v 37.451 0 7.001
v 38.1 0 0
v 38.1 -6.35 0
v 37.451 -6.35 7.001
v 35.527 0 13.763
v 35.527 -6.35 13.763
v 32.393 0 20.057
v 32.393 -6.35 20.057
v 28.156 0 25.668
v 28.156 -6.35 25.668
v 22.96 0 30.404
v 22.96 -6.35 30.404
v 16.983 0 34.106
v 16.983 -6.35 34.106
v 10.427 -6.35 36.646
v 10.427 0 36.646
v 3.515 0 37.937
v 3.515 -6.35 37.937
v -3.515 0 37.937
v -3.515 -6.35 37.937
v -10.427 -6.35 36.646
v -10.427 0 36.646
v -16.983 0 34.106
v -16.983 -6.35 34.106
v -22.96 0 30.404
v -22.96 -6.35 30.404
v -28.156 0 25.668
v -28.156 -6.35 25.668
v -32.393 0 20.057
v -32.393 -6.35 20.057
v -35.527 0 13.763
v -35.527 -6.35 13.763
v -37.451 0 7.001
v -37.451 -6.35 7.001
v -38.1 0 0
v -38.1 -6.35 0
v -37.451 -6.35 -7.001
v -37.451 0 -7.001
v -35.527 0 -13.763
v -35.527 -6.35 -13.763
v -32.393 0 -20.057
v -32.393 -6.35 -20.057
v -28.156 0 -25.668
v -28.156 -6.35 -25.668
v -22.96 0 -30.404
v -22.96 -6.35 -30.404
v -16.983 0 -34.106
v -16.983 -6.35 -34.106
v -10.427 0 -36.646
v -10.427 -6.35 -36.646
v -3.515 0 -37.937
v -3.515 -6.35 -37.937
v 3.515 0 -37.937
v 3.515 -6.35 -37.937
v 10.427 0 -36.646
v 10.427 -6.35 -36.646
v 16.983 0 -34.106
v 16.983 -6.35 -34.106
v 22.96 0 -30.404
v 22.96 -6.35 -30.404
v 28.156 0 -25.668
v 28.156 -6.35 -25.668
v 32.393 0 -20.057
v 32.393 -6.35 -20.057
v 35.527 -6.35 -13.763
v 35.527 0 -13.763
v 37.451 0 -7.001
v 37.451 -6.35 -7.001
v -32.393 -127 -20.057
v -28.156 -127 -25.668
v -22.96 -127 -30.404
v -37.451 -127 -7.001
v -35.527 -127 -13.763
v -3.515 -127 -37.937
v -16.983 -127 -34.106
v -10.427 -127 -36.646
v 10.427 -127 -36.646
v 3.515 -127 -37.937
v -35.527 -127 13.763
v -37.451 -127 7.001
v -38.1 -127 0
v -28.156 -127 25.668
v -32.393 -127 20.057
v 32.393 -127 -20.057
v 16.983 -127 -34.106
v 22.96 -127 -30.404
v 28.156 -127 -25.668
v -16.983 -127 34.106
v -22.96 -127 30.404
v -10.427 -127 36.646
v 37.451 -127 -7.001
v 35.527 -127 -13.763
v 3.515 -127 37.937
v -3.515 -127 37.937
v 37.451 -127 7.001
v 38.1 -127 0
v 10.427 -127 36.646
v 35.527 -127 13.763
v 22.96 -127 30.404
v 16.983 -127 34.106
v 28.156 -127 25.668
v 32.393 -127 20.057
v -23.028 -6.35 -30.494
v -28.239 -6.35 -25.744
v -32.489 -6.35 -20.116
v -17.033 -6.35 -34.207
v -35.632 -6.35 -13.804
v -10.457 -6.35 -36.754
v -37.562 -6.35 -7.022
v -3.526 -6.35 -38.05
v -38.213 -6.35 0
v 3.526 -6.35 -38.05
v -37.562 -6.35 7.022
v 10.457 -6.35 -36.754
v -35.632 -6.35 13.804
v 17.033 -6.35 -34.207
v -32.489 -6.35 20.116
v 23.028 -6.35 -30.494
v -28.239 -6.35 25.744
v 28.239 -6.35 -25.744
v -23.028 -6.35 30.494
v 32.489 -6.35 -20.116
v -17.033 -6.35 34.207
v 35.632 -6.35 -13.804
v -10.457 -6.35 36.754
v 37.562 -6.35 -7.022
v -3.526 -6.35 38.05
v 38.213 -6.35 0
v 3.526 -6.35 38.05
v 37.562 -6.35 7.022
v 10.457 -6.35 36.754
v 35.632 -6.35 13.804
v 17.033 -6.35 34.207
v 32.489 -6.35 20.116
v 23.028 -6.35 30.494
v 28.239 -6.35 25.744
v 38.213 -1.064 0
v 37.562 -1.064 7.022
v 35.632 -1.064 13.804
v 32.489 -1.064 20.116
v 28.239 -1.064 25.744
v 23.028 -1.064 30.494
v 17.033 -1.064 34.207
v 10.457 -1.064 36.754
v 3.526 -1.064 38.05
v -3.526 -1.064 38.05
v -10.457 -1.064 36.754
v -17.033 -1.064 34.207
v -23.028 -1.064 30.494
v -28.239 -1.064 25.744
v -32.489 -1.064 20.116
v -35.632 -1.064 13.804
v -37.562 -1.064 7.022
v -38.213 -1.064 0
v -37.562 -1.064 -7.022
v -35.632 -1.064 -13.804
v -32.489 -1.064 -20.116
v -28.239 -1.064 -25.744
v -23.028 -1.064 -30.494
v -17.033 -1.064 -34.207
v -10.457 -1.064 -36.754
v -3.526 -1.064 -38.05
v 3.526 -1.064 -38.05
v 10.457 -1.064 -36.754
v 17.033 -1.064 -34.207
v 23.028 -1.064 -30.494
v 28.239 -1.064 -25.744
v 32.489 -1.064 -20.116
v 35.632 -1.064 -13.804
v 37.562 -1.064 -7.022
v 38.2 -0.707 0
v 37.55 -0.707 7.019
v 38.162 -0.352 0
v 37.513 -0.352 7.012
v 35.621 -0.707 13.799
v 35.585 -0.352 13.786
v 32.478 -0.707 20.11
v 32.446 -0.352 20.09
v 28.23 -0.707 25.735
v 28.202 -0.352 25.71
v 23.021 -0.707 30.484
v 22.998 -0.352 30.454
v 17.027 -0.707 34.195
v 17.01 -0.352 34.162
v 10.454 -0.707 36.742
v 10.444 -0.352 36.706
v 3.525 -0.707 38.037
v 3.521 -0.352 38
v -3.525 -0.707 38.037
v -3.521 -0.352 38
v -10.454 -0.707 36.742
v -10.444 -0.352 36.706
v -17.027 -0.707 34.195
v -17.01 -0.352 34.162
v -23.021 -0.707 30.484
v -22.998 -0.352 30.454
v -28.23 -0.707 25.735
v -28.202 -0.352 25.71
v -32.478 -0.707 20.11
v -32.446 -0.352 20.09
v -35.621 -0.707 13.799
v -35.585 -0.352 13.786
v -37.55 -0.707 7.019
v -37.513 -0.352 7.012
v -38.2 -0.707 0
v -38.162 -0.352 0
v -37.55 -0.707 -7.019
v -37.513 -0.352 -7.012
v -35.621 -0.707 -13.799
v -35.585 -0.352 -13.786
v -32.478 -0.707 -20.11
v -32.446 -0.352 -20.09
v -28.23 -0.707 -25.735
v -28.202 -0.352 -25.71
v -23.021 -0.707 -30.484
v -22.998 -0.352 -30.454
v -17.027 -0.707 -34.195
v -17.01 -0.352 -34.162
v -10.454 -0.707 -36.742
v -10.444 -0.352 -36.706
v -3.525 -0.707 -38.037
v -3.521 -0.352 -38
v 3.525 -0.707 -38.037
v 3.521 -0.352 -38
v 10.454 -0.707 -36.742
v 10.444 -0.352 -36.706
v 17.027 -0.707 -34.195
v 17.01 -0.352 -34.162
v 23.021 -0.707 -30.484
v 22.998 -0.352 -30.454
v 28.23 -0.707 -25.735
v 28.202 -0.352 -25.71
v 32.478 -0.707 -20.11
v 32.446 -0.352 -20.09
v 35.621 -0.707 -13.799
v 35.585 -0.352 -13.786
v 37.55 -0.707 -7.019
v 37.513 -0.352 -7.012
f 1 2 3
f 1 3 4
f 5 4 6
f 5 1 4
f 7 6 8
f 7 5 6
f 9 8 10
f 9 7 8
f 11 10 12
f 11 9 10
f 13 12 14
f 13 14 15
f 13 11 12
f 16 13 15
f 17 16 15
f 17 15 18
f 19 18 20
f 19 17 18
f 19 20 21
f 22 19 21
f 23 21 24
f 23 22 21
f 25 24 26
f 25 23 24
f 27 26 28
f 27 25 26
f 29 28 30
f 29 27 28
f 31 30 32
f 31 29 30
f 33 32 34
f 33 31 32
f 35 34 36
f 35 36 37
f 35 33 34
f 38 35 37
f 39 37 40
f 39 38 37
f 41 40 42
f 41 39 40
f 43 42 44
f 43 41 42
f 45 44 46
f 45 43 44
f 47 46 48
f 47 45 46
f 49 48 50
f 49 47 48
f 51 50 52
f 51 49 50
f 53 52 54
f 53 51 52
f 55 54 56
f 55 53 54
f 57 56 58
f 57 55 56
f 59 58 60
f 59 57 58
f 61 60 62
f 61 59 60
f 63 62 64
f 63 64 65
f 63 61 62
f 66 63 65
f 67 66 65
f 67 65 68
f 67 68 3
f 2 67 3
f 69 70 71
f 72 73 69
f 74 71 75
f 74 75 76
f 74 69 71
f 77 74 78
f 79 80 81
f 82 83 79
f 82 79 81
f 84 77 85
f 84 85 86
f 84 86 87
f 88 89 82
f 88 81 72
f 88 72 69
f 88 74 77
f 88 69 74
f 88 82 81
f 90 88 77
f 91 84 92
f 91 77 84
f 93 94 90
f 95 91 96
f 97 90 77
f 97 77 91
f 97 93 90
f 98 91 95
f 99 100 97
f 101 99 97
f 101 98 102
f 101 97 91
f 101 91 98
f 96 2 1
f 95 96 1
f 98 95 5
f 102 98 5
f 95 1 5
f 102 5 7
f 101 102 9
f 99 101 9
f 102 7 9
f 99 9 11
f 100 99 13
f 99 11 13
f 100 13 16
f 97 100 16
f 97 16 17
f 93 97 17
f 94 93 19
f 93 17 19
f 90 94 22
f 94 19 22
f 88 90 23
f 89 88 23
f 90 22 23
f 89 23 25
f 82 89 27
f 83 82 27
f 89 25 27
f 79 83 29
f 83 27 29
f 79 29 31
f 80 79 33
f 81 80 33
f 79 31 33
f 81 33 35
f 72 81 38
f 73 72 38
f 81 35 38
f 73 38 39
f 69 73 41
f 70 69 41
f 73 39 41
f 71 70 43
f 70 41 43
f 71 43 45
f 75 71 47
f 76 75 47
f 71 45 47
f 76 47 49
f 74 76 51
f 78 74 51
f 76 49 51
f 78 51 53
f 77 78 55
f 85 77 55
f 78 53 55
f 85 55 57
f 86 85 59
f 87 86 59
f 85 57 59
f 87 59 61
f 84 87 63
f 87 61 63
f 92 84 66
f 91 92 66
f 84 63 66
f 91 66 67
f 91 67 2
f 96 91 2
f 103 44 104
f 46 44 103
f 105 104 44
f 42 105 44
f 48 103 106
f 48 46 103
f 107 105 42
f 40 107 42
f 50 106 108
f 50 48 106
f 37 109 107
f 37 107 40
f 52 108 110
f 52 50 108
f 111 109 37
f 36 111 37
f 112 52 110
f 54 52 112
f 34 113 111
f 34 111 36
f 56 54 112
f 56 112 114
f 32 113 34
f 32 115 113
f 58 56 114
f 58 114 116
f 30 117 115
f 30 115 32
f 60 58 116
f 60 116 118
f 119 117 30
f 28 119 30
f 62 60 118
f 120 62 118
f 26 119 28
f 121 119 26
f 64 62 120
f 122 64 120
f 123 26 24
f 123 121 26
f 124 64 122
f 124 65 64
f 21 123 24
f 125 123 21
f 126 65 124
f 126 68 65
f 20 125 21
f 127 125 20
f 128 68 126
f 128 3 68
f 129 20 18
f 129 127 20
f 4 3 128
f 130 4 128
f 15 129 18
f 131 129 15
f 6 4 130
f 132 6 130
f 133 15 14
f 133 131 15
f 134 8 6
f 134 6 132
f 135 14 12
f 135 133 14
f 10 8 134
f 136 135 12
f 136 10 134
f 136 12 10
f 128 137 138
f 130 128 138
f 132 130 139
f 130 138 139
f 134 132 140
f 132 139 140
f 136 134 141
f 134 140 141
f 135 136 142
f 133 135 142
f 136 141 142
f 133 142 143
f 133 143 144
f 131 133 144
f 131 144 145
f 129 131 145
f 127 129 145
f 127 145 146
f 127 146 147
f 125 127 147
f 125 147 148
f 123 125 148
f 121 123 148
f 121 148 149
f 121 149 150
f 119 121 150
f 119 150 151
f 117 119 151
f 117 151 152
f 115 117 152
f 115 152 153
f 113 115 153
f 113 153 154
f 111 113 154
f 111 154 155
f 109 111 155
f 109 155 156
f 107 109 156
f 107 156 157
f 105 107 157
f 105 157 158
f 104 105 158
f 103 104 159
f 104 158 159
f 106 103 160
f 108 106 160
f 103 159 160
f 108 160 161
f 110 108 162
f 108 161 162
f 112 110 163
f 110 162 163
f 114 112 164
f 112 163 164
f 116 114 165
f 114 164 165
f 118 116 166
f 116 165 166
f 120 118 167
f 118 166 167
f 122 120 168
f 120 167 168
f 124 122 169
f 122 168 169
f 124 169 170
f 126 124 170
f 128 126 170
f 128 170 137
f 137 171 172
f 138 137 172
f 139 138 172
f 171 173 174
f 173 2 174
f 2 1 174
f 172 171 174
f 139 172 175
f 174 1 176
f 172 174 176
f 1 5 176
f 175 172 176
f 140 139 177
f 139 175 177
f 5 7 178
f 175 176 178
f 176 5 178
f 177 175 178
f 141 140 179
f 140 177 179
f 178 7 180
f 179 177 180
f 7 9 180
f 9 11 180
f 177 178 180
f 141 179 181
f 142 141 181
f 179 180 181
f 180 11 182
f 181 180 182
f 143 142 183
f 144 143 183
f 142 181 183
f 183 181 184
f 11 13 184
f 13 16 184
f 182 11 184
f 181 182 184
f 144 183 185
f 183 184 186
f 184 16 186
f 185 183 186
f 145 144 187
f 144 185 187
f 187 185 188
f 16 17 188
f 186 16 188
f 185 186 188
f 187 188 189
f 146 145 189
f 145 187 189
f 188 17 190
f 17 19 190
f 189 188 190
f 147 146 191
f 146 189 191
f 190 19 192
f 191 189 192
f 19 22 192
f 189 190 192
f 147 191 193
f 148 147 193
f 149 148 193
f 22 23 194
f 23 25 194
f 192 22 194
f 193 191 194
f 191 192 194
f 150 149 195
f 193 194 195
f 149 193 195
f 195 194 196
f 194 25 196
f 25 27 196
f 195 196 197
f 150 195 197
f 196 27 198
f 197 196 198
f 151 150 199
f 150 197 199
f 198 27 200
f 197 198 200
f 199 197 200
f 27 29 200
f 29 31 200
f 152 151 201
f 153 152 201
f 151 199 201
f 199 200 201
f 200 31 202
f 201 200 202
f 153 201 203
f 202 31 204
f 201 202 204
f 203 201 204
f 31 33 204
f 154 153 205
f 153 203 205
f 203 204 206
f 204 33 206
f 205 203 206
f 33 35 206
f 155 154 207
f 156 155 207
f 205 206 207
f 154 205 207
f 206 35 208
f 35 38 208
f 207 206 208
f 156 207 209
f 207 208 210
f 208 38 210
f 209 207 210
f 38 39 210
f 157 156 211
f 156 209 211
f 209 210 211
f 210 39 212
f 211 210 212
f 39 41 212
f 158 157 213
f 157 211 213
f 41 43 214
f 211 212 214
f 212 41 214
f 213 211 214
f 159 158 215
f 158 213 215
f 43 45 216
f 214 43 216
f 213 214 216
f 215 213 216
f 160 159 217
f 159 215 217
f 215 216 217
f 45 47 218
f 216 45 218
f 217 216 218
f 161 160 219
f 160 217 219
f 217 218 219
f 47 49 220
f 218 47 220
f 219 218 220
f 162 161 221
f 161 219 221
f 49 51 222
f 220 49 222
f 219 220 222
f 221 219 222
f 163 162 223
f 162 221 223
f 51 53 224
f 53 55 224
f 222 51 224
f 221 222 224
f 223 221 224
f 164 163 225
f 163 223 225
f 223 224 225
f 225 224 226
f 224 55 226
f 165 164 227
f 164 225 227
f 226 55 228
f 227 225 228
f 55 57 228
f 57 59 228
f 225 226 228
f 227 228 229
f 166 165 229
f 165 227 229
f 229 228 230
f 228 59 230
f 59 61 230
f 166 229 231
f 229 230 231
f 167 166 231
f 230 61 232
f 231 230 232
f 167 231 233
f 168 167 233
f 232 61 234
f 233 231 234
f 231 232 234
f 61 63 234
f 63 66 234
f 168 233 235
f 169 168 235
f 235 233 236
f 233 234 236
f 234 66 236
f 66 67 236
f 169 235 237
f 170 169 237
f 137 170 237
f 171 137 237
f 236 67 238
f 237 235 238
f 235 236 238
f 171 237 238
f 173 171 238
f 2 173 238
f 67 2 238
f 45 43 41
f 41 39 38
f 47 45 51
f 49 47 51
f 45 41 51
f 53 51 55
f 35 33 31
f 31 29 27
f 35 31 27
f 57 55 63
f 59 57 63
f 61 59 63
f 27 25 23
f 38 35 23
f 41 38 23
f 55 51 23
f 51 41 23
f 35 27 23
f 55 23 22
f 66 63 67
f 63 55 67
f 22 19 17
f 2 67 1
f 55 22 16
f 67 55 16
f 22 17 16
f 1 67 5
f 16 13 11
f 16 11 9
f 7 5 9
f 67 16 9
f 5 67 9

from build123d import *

# Parameters (mm, degrees)
F0_R     = 38.2126464565
F0_R_2   = 38.1
F1_DEPTH = 6.35
F2_DEPTH = 127


# Not quite as in the source:
# - a fillet or chamfer that OpenCascade refuses, or shapes differently, is made with other operations: its cross-section is extruded or revolved along the edge and cut away or added
# - the program builds the solid bodies; features that only make, move or delete a surface that nothing else refers to are left out


with BuildPart() as f1:
    # F0 (on Front) → F1 (new body)
    with BuildSketch(Plane.XZ):
        Circle(F0_R)
        Circle(F0_R_2, mode=Mode.SUBTRACT)
    extrude(amount=F1_DEPTH)

    # F4: fillet of radius 5.08 on 1 edges, made by hand

    # F4_s1 → F4_t2 (revolve, cut)
    with BuildSketch(Plane.XY):
        with BuildLine():
            ThreePointArc((38.2126464565, -1.0638603171), (38.1844063479, -0.5289565878), (38.1, 0))
            Line((38.1, 0), (38.1993470709, 0.0212772063))
            ThreePointArc((38.1993470709, 0.0212772063), (38.1563232283, 0.1016), (38.2126464565, 0.1016))
            Line((38.2126464565, 0.1016), (38.3142464565, 0))
            Line((38.3142464565, 0), (38.3142464565, -1.0638603171))
            Line((38.3142464565, -1.0638603171), (38.2126464565, -1.0638603171))
        make_face()
    revolve(axis=Axis((0, 0, 0), (0, -1, 0)), mode=Mode.SUBTRACT)


with BuildPart() as f2:
    # F0 (on Front) → F2 (new body)
    with BuildSketch(Plane.XZ):
        Circle(F0_R_2)
    extrude(amount=F2_DEPTH)


solid = Compound([f1.part, f2.part])
